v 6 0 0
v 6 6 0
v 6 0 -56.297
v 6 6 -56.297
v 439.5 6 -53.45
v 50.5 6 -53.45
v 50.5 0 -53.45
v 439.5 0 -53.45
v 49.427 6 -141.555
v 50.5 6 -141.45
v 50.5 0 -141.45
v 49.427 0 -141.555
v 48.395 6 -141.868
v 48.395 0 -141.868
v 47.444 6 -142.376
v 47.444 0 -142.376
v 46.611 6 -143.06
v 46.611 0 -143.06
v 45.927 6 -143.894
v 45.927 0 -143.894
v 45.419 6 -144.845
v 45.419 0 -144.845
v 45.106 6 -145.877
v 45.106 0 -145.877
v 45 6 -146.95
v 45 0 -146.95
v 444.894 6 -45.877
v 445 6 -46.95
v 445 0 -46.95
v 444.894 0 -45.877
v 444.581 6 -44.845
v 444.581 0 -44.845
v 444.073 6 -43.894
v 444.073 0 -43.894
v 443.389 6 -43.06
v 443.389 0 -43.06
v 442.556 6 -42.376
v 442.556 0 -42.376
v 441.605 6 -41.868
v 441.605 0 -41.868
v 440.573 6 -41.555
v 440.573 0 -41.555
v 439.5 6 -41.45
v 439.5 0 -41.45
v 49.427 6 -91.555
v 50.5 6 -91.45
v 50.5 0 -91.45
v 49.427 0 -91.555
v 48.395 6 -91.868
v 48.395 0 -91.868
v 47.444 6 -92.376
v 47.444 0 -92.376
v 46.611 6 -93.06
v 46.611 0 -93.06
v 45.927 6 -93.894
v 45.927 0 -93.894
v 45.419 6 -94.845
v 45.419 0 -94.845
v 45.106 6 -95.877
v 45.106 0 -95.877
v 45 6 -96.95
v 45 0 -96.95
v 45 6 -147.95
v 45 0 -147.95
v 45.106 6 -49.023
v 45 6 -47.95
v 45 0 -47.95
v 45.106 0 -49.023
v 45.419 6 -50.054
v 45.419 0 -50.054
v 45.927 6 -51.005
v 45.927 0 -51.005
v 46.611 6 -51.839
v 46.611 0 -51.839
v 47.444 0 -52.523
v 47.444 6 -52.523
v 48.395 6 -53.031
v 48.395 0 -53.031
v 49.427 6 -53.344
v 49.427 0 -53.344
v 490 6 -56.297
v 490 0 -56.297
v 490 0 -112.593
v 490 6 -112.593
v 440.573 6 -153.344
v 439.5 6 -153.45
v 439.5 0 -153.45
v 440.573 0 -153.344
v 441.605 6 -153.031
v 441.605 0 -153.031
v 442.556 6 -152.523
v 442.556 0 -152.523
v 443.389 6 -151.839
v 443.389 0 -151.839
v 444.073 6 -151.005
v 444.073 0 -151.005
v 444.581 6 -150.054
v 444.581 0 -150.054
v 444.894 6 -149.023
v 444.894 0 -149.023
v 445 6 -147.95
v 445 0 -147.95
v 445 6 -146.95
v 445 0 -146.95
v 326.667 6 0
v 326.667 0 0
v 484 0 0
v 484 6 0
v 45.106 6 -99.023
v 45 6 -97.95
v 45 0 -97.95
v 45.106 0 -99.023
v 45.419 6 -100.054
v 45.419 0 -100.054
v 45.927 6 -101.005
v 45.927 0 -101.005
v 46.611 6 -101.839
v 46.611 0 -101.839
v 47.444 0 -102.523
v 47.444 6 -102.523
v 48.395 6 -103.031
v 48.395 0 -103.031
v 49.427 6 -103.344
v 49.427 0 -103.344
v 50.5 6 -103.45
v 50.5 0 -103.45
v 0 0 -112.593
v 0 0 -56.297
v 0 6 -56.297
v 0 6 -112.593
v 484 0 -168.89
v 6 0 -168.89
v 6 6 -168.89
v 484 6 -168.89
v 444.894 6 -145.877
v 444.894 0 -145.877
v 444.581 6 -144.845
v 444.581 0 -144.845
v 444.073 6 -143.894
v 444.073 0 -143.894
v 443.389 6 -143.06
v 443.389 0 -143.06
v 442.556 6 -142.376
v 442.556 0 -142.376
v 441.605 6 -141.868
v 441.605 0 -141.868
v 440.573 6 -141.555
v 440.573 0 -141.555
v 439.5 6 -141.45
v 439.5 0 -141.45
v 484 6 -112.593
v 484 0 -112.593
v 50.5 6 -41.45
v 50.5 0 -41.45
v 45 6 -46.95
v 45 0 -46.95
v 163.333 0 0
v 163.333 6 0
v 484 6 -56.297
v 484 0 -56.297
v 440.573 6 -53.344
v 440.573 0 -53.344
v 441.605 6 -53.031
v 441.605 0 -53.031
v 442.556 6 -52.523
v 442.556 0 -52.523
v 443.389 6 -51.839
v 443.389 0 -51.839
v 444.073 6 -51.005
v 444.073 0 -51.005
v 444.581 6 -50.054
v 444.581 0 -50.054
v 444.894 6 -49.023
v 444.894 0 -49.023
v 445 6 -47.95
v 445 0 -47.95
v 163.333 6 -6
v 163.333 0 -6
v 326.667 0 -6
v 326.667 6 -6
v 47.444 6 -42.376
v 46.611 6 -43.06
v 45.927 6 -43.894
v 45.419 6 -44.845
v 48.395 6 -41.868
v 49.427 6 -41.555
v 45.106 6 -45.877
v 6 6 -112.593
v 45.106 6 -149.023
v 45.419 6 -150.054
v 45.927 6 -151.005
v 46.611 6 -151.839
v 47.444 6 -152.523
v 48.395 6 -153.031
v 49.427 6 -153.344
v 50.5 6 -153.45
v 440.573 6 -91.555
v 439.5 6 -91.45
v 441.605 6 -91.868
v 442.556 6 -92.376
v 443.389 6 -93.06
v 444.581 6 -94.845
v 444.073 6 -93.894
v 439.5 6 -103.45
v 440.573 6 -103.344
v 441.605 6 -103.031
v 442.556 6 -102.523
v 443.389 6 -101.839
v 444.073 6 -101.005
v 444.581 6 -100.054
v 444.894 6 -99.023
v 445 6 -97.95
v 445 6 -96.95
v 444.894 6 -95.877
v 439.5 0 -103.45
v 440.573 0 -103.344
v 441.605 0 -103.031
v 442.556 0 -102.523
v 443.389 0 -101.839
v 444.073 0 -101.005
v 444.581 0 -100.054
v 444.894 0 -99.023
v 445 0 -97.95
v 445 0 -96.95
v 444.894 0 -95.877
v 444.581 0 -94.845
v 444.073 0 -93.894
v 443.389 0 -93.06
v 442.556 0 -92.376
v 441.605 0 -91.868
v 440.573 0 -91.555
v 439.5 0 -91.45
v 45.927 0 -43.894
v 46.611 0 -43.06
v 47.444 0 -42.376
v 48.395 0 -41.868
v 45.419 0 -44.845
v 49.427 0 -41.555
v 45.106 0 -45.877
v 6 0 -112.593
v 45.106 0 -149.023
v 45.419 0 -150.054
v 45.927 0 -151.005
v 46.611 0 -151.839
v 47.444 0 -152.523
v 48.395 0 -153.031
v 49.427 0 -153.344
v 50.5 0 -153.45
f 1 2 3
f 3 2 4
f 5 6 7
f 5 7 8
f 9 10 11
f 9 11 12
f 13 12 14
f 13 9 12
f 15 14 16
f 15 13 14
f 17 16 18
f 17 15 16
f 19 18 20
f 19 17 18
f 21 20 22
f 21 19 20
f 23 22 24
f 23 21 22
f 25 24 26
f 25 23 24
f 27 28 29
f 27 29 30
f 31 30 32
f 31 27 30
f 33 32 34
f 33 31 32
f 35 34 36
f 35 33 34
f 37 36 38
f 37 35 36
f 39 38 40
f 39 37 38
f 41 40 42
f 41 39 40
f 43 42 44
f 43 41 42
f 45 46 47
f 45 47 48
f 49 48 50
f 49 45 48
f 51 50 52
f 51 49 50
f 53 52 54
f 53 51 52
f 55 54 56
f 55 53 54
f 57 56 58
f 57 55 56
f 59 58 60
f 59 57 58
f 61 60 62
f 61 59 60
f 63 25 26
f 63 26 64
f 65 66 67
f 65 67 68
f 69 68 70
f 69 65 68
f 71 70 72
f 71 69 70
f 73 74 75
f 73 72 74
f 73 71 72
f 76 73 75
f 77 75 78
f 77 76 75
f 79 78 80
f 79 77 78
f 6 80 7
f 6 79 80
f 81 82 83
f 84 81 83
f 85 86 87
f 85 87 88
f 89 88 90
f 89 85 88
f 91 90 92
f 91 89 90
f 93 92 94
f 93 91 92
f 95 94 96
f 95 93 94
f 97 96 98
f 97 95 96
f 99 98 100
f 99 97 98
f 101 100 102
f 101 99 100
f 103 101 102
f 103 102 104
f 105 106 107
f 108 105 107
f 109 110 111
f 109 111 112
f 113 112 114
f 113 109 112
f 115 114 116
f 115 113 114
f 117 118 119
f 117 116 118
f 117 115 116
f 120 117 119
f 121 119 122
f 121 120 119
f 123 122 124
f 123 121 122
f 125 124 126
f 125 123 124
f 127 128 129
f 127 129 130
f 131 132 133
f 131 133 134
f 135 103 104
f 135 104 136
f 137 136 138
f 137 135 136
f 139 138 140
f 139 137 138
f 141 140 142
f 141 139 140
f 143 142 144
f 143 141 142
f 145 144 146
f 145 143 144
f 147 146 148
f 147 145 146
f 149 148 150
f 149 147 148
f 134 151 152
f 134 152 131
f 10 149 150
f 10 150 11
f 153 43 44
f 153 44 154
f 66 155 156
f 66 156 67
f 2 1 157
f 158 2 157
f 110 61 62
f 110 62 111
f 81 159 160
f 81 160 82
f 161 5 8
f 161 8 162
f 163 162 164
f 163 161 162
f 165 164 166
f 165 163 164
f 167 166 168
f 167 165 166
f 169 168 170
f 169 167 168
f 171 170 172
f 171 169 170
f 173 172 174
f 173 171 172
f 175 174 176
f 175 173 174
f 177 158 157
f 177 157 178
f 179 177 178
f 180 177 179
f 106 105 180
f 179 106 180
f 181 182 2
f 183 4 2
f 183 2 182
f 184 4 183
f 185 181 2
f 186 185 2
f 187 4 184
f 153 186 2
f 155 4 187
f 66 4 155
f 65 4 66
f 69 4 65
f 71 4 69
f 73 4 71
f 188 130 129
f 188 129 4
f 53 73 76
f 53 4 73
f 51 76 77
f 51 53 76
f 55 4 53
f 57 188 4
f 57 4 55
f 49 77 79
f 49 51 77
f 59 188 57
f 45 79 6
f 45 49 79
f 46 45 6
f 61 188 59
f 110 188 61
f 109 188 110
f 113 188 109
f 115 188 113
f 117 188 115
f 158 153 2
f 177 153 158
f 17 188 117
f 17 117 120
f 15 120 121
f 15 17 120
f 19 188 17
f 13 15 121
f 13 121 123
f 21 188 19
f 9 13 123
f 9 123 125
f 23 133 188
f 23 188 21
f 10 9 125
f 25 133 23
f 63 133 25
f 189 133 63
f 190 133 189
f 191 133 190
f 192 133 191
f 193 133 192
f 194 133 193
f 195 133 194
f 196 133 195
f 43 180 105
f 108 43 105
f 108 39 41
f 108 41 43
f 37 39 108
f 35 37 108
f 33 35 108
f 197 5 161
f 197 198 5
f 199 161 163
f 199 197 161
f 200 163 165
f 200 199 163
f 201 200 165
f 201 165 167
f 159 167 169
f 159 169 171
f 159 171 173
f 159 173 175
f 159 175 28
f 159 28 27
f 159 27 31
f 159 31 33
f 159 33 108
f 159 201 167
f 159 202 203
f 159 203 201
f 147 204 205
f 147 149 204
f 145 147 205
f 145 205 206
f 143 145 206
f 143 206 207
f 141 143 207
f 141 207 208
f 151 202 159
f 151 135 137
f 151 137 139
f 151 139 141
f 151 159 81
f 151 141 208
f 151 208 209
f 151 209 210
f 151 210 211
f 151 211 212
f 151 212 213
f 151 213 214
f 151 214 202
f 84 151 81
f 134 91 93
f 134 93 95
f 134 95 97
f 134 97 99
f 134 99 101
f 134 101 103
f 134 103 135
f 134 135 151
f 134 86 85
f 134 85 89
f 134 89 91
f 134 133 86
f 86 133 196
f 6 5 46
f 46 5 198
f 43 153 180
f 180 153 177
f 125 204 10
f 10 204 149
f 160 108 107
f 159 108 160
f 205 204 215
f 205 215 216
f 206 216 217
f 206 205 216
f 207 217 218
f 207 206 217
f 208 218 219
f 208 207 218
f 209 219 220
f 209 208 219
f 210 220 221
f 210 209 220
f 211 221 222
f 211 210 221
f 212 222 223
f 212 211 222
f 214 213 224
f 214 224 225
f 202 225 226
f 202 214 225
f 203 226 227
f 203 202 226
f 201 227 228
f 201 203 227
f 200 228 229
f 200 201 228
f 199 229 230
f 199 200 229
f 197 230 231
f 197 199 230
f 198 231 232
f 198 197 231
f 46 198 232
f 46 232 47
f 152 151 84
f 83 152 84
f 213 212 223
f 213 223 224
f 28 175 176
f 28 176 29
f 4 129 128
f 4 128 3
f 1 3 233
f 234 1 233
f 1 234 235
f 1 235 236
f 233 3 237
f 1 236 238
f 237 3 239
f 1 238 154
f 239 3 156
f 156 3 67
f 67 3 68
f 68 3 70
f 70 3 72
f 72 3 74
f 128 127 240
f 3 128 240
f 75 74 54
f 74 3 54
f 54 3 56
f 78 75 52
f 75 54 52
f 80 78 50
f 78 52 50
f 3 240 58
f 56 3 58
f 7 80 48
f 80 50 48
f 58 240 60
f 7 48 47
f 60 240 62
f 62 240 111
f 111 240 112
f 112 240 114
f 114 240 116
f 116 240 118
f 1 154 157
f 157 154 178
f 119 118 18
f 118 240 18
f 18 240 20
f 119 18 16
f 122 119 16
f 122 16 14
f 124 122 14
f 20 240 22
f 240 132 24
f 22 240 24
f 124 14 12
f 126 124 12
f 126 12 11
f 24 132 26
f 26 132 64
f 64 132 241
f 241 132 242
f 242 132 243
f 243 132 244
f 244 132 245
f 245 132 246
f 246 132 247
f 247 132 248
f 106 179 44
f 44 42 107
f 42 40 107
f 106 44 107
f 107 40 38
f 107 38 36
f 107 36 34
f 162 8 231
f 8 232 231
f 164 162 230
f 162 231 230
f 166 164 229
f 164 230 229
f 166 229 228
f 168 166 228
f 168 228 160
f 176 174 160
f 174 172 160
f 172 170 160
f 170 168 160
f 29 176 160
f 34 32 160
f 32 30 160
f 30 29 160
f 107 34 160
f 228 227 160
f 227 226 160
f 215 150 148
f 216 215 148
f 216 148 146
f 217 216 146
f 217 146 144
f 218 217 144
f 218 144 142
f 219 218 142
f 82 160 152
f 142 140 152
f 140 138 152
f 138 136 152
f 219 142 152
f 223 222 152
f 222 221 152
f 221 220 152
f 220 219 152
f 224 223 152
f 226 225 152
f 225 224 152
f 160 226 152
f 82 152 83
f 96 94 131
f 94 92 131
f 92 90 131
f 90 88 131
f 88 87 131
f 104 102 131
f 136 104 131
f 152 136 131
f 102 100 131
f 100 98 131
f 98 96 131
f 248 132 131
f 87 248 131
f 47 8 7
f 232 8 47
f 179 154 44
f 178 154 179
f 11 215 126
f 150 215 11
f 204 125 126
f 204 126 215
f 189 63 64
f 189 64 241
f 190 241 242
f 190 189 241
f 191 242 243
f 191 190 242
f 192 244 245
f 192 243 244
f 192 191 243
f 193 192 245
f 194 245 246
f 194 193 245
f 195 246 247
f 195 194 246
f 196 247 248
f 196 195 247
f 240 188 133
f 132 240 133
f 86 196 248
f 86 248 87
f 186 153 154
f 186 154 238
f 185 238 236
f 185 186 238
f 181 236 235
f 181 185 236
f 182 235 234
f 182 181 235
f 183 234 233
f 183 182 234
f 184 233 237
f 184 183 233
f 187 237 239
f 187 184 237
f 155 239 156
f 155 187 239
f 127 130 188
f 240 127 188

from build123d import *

# Parameters (mm, degrees)
SKETCH1_W           = 490
SKETCH1_H           = 168.89
BOSS_EXTRUDE1_DEPTH = 6
SKETCH2_W           = 163.333333334
SKETCH2_H           = 6
CUT_EXTRUDE1_DEPTH  = 519.324060892
SKETCH4_W           = 6
SKETCH4_H           = 56.296666667
CUT_EXTRUDE3_DEPTH  = 519.324060892
CUT_EXTRUDE4_DEPTH  = 519.324060892
LPATTERN1_COUNT     = 3
LPATTERN1_PITCH     = 50


with BuildPart() as part:
    # Sketch1 → Boss-Extrude1 (new body)
    with BuildSketch(Plane(origin=(0, 0, 0), x_dir=(1, 0, 0), z_dir=(0, 1, 0))):
        with Locations((245, 84.445)):
            Rectangle(SKETCH1_W, SKETCH1_H)
    extrude(amount=BOSS_EXTRUDE1_DEPTH)

    # Sketch2 → Cut-Extrude1 (cut, through all)
    with BuildSketch(Plane(origin=(0, 6, 0), x_dir=(1, 0, 0), z_dir=(0, 1, 0))):
        with Locations((245, 3)):
            Rectangle(SKETCH2_W, SKETCH2_H)
    extrude(amount=-CUT_EXTRUDE1_DEPTH, mode=Mode.SUBTRACT)

    # Sketch4 → Cut-Extrude3 (cut, through all)
    with BuildSketch(Plane(origin=(0, 6, 0), x_dir=(1, 0, 0), z_dir=(0, 1, 0))):
        with Locations((3, 140.741666667)):
            Rectangle(SKETCH4_W, SKETCH4_H)
        with Locations((3, 28.148333334)):
            Rectangle(SKETCH4_W, SKETCH4_H)
        with Locations((487, 28.148333334)):
            Rectangle(SKETCH4_W, SKETCH4_H)
        with Locations((487, 140.741666667)):
            Rectangle(SKETCH4_W, SKETCH4_H)
    extrude(amount=-CUT_EXTRUDE3_DEPTH, mode=Mode.SUBTRACT)

    # Sketch5 → Cut-Extrude4 (cut, through all)
    with BuildSketch(Plane(origin=(0, 6, 0), x_dir=(1, 0, 0), z_dir=(0, 1, 0))):
        with BuildLine():
            Line((50.5, 153.449523313), (439.5, 153.449523313))
            ThreePointArc((439.5, 153.449523313), (443.389087297, 151.838610609), (445, 147.949523313))
            Line((445, 147.949523313), (445, 146.949523313))
            ThreePointArc((445, 146.949523313), (443.389087297, 143.060436016), (439.5, 141.449523313))
            Line((439.5, 141.449523313), (50.5, 141.449523313))
            ThreePointArc((50.5, 141.449523313), (46.610912703, 143.060436016), (45, 146.949523313))
            Line((45, 146.949523313), (45, 147.949523313))
            ThreePointArc((45, 147.949523313), (46.610912703, 151.838610609), (50.5, 153.449523313))
        make_face()
    cut_extrude4 = extrude(amount=-CUT_EXTRUDE4_DEPTH, mode=Mode.SUBTRACT)

    # LPattern1: Cut-Extrude4 ×3
    with Locations(*[(0, 0, i * LPATTERN1_PITCH) for i in range(1, LPATTERN1_COUNT)]):
        add(cut_extrude4, mode=Mode.SUBTRACT)


solid = part.part
